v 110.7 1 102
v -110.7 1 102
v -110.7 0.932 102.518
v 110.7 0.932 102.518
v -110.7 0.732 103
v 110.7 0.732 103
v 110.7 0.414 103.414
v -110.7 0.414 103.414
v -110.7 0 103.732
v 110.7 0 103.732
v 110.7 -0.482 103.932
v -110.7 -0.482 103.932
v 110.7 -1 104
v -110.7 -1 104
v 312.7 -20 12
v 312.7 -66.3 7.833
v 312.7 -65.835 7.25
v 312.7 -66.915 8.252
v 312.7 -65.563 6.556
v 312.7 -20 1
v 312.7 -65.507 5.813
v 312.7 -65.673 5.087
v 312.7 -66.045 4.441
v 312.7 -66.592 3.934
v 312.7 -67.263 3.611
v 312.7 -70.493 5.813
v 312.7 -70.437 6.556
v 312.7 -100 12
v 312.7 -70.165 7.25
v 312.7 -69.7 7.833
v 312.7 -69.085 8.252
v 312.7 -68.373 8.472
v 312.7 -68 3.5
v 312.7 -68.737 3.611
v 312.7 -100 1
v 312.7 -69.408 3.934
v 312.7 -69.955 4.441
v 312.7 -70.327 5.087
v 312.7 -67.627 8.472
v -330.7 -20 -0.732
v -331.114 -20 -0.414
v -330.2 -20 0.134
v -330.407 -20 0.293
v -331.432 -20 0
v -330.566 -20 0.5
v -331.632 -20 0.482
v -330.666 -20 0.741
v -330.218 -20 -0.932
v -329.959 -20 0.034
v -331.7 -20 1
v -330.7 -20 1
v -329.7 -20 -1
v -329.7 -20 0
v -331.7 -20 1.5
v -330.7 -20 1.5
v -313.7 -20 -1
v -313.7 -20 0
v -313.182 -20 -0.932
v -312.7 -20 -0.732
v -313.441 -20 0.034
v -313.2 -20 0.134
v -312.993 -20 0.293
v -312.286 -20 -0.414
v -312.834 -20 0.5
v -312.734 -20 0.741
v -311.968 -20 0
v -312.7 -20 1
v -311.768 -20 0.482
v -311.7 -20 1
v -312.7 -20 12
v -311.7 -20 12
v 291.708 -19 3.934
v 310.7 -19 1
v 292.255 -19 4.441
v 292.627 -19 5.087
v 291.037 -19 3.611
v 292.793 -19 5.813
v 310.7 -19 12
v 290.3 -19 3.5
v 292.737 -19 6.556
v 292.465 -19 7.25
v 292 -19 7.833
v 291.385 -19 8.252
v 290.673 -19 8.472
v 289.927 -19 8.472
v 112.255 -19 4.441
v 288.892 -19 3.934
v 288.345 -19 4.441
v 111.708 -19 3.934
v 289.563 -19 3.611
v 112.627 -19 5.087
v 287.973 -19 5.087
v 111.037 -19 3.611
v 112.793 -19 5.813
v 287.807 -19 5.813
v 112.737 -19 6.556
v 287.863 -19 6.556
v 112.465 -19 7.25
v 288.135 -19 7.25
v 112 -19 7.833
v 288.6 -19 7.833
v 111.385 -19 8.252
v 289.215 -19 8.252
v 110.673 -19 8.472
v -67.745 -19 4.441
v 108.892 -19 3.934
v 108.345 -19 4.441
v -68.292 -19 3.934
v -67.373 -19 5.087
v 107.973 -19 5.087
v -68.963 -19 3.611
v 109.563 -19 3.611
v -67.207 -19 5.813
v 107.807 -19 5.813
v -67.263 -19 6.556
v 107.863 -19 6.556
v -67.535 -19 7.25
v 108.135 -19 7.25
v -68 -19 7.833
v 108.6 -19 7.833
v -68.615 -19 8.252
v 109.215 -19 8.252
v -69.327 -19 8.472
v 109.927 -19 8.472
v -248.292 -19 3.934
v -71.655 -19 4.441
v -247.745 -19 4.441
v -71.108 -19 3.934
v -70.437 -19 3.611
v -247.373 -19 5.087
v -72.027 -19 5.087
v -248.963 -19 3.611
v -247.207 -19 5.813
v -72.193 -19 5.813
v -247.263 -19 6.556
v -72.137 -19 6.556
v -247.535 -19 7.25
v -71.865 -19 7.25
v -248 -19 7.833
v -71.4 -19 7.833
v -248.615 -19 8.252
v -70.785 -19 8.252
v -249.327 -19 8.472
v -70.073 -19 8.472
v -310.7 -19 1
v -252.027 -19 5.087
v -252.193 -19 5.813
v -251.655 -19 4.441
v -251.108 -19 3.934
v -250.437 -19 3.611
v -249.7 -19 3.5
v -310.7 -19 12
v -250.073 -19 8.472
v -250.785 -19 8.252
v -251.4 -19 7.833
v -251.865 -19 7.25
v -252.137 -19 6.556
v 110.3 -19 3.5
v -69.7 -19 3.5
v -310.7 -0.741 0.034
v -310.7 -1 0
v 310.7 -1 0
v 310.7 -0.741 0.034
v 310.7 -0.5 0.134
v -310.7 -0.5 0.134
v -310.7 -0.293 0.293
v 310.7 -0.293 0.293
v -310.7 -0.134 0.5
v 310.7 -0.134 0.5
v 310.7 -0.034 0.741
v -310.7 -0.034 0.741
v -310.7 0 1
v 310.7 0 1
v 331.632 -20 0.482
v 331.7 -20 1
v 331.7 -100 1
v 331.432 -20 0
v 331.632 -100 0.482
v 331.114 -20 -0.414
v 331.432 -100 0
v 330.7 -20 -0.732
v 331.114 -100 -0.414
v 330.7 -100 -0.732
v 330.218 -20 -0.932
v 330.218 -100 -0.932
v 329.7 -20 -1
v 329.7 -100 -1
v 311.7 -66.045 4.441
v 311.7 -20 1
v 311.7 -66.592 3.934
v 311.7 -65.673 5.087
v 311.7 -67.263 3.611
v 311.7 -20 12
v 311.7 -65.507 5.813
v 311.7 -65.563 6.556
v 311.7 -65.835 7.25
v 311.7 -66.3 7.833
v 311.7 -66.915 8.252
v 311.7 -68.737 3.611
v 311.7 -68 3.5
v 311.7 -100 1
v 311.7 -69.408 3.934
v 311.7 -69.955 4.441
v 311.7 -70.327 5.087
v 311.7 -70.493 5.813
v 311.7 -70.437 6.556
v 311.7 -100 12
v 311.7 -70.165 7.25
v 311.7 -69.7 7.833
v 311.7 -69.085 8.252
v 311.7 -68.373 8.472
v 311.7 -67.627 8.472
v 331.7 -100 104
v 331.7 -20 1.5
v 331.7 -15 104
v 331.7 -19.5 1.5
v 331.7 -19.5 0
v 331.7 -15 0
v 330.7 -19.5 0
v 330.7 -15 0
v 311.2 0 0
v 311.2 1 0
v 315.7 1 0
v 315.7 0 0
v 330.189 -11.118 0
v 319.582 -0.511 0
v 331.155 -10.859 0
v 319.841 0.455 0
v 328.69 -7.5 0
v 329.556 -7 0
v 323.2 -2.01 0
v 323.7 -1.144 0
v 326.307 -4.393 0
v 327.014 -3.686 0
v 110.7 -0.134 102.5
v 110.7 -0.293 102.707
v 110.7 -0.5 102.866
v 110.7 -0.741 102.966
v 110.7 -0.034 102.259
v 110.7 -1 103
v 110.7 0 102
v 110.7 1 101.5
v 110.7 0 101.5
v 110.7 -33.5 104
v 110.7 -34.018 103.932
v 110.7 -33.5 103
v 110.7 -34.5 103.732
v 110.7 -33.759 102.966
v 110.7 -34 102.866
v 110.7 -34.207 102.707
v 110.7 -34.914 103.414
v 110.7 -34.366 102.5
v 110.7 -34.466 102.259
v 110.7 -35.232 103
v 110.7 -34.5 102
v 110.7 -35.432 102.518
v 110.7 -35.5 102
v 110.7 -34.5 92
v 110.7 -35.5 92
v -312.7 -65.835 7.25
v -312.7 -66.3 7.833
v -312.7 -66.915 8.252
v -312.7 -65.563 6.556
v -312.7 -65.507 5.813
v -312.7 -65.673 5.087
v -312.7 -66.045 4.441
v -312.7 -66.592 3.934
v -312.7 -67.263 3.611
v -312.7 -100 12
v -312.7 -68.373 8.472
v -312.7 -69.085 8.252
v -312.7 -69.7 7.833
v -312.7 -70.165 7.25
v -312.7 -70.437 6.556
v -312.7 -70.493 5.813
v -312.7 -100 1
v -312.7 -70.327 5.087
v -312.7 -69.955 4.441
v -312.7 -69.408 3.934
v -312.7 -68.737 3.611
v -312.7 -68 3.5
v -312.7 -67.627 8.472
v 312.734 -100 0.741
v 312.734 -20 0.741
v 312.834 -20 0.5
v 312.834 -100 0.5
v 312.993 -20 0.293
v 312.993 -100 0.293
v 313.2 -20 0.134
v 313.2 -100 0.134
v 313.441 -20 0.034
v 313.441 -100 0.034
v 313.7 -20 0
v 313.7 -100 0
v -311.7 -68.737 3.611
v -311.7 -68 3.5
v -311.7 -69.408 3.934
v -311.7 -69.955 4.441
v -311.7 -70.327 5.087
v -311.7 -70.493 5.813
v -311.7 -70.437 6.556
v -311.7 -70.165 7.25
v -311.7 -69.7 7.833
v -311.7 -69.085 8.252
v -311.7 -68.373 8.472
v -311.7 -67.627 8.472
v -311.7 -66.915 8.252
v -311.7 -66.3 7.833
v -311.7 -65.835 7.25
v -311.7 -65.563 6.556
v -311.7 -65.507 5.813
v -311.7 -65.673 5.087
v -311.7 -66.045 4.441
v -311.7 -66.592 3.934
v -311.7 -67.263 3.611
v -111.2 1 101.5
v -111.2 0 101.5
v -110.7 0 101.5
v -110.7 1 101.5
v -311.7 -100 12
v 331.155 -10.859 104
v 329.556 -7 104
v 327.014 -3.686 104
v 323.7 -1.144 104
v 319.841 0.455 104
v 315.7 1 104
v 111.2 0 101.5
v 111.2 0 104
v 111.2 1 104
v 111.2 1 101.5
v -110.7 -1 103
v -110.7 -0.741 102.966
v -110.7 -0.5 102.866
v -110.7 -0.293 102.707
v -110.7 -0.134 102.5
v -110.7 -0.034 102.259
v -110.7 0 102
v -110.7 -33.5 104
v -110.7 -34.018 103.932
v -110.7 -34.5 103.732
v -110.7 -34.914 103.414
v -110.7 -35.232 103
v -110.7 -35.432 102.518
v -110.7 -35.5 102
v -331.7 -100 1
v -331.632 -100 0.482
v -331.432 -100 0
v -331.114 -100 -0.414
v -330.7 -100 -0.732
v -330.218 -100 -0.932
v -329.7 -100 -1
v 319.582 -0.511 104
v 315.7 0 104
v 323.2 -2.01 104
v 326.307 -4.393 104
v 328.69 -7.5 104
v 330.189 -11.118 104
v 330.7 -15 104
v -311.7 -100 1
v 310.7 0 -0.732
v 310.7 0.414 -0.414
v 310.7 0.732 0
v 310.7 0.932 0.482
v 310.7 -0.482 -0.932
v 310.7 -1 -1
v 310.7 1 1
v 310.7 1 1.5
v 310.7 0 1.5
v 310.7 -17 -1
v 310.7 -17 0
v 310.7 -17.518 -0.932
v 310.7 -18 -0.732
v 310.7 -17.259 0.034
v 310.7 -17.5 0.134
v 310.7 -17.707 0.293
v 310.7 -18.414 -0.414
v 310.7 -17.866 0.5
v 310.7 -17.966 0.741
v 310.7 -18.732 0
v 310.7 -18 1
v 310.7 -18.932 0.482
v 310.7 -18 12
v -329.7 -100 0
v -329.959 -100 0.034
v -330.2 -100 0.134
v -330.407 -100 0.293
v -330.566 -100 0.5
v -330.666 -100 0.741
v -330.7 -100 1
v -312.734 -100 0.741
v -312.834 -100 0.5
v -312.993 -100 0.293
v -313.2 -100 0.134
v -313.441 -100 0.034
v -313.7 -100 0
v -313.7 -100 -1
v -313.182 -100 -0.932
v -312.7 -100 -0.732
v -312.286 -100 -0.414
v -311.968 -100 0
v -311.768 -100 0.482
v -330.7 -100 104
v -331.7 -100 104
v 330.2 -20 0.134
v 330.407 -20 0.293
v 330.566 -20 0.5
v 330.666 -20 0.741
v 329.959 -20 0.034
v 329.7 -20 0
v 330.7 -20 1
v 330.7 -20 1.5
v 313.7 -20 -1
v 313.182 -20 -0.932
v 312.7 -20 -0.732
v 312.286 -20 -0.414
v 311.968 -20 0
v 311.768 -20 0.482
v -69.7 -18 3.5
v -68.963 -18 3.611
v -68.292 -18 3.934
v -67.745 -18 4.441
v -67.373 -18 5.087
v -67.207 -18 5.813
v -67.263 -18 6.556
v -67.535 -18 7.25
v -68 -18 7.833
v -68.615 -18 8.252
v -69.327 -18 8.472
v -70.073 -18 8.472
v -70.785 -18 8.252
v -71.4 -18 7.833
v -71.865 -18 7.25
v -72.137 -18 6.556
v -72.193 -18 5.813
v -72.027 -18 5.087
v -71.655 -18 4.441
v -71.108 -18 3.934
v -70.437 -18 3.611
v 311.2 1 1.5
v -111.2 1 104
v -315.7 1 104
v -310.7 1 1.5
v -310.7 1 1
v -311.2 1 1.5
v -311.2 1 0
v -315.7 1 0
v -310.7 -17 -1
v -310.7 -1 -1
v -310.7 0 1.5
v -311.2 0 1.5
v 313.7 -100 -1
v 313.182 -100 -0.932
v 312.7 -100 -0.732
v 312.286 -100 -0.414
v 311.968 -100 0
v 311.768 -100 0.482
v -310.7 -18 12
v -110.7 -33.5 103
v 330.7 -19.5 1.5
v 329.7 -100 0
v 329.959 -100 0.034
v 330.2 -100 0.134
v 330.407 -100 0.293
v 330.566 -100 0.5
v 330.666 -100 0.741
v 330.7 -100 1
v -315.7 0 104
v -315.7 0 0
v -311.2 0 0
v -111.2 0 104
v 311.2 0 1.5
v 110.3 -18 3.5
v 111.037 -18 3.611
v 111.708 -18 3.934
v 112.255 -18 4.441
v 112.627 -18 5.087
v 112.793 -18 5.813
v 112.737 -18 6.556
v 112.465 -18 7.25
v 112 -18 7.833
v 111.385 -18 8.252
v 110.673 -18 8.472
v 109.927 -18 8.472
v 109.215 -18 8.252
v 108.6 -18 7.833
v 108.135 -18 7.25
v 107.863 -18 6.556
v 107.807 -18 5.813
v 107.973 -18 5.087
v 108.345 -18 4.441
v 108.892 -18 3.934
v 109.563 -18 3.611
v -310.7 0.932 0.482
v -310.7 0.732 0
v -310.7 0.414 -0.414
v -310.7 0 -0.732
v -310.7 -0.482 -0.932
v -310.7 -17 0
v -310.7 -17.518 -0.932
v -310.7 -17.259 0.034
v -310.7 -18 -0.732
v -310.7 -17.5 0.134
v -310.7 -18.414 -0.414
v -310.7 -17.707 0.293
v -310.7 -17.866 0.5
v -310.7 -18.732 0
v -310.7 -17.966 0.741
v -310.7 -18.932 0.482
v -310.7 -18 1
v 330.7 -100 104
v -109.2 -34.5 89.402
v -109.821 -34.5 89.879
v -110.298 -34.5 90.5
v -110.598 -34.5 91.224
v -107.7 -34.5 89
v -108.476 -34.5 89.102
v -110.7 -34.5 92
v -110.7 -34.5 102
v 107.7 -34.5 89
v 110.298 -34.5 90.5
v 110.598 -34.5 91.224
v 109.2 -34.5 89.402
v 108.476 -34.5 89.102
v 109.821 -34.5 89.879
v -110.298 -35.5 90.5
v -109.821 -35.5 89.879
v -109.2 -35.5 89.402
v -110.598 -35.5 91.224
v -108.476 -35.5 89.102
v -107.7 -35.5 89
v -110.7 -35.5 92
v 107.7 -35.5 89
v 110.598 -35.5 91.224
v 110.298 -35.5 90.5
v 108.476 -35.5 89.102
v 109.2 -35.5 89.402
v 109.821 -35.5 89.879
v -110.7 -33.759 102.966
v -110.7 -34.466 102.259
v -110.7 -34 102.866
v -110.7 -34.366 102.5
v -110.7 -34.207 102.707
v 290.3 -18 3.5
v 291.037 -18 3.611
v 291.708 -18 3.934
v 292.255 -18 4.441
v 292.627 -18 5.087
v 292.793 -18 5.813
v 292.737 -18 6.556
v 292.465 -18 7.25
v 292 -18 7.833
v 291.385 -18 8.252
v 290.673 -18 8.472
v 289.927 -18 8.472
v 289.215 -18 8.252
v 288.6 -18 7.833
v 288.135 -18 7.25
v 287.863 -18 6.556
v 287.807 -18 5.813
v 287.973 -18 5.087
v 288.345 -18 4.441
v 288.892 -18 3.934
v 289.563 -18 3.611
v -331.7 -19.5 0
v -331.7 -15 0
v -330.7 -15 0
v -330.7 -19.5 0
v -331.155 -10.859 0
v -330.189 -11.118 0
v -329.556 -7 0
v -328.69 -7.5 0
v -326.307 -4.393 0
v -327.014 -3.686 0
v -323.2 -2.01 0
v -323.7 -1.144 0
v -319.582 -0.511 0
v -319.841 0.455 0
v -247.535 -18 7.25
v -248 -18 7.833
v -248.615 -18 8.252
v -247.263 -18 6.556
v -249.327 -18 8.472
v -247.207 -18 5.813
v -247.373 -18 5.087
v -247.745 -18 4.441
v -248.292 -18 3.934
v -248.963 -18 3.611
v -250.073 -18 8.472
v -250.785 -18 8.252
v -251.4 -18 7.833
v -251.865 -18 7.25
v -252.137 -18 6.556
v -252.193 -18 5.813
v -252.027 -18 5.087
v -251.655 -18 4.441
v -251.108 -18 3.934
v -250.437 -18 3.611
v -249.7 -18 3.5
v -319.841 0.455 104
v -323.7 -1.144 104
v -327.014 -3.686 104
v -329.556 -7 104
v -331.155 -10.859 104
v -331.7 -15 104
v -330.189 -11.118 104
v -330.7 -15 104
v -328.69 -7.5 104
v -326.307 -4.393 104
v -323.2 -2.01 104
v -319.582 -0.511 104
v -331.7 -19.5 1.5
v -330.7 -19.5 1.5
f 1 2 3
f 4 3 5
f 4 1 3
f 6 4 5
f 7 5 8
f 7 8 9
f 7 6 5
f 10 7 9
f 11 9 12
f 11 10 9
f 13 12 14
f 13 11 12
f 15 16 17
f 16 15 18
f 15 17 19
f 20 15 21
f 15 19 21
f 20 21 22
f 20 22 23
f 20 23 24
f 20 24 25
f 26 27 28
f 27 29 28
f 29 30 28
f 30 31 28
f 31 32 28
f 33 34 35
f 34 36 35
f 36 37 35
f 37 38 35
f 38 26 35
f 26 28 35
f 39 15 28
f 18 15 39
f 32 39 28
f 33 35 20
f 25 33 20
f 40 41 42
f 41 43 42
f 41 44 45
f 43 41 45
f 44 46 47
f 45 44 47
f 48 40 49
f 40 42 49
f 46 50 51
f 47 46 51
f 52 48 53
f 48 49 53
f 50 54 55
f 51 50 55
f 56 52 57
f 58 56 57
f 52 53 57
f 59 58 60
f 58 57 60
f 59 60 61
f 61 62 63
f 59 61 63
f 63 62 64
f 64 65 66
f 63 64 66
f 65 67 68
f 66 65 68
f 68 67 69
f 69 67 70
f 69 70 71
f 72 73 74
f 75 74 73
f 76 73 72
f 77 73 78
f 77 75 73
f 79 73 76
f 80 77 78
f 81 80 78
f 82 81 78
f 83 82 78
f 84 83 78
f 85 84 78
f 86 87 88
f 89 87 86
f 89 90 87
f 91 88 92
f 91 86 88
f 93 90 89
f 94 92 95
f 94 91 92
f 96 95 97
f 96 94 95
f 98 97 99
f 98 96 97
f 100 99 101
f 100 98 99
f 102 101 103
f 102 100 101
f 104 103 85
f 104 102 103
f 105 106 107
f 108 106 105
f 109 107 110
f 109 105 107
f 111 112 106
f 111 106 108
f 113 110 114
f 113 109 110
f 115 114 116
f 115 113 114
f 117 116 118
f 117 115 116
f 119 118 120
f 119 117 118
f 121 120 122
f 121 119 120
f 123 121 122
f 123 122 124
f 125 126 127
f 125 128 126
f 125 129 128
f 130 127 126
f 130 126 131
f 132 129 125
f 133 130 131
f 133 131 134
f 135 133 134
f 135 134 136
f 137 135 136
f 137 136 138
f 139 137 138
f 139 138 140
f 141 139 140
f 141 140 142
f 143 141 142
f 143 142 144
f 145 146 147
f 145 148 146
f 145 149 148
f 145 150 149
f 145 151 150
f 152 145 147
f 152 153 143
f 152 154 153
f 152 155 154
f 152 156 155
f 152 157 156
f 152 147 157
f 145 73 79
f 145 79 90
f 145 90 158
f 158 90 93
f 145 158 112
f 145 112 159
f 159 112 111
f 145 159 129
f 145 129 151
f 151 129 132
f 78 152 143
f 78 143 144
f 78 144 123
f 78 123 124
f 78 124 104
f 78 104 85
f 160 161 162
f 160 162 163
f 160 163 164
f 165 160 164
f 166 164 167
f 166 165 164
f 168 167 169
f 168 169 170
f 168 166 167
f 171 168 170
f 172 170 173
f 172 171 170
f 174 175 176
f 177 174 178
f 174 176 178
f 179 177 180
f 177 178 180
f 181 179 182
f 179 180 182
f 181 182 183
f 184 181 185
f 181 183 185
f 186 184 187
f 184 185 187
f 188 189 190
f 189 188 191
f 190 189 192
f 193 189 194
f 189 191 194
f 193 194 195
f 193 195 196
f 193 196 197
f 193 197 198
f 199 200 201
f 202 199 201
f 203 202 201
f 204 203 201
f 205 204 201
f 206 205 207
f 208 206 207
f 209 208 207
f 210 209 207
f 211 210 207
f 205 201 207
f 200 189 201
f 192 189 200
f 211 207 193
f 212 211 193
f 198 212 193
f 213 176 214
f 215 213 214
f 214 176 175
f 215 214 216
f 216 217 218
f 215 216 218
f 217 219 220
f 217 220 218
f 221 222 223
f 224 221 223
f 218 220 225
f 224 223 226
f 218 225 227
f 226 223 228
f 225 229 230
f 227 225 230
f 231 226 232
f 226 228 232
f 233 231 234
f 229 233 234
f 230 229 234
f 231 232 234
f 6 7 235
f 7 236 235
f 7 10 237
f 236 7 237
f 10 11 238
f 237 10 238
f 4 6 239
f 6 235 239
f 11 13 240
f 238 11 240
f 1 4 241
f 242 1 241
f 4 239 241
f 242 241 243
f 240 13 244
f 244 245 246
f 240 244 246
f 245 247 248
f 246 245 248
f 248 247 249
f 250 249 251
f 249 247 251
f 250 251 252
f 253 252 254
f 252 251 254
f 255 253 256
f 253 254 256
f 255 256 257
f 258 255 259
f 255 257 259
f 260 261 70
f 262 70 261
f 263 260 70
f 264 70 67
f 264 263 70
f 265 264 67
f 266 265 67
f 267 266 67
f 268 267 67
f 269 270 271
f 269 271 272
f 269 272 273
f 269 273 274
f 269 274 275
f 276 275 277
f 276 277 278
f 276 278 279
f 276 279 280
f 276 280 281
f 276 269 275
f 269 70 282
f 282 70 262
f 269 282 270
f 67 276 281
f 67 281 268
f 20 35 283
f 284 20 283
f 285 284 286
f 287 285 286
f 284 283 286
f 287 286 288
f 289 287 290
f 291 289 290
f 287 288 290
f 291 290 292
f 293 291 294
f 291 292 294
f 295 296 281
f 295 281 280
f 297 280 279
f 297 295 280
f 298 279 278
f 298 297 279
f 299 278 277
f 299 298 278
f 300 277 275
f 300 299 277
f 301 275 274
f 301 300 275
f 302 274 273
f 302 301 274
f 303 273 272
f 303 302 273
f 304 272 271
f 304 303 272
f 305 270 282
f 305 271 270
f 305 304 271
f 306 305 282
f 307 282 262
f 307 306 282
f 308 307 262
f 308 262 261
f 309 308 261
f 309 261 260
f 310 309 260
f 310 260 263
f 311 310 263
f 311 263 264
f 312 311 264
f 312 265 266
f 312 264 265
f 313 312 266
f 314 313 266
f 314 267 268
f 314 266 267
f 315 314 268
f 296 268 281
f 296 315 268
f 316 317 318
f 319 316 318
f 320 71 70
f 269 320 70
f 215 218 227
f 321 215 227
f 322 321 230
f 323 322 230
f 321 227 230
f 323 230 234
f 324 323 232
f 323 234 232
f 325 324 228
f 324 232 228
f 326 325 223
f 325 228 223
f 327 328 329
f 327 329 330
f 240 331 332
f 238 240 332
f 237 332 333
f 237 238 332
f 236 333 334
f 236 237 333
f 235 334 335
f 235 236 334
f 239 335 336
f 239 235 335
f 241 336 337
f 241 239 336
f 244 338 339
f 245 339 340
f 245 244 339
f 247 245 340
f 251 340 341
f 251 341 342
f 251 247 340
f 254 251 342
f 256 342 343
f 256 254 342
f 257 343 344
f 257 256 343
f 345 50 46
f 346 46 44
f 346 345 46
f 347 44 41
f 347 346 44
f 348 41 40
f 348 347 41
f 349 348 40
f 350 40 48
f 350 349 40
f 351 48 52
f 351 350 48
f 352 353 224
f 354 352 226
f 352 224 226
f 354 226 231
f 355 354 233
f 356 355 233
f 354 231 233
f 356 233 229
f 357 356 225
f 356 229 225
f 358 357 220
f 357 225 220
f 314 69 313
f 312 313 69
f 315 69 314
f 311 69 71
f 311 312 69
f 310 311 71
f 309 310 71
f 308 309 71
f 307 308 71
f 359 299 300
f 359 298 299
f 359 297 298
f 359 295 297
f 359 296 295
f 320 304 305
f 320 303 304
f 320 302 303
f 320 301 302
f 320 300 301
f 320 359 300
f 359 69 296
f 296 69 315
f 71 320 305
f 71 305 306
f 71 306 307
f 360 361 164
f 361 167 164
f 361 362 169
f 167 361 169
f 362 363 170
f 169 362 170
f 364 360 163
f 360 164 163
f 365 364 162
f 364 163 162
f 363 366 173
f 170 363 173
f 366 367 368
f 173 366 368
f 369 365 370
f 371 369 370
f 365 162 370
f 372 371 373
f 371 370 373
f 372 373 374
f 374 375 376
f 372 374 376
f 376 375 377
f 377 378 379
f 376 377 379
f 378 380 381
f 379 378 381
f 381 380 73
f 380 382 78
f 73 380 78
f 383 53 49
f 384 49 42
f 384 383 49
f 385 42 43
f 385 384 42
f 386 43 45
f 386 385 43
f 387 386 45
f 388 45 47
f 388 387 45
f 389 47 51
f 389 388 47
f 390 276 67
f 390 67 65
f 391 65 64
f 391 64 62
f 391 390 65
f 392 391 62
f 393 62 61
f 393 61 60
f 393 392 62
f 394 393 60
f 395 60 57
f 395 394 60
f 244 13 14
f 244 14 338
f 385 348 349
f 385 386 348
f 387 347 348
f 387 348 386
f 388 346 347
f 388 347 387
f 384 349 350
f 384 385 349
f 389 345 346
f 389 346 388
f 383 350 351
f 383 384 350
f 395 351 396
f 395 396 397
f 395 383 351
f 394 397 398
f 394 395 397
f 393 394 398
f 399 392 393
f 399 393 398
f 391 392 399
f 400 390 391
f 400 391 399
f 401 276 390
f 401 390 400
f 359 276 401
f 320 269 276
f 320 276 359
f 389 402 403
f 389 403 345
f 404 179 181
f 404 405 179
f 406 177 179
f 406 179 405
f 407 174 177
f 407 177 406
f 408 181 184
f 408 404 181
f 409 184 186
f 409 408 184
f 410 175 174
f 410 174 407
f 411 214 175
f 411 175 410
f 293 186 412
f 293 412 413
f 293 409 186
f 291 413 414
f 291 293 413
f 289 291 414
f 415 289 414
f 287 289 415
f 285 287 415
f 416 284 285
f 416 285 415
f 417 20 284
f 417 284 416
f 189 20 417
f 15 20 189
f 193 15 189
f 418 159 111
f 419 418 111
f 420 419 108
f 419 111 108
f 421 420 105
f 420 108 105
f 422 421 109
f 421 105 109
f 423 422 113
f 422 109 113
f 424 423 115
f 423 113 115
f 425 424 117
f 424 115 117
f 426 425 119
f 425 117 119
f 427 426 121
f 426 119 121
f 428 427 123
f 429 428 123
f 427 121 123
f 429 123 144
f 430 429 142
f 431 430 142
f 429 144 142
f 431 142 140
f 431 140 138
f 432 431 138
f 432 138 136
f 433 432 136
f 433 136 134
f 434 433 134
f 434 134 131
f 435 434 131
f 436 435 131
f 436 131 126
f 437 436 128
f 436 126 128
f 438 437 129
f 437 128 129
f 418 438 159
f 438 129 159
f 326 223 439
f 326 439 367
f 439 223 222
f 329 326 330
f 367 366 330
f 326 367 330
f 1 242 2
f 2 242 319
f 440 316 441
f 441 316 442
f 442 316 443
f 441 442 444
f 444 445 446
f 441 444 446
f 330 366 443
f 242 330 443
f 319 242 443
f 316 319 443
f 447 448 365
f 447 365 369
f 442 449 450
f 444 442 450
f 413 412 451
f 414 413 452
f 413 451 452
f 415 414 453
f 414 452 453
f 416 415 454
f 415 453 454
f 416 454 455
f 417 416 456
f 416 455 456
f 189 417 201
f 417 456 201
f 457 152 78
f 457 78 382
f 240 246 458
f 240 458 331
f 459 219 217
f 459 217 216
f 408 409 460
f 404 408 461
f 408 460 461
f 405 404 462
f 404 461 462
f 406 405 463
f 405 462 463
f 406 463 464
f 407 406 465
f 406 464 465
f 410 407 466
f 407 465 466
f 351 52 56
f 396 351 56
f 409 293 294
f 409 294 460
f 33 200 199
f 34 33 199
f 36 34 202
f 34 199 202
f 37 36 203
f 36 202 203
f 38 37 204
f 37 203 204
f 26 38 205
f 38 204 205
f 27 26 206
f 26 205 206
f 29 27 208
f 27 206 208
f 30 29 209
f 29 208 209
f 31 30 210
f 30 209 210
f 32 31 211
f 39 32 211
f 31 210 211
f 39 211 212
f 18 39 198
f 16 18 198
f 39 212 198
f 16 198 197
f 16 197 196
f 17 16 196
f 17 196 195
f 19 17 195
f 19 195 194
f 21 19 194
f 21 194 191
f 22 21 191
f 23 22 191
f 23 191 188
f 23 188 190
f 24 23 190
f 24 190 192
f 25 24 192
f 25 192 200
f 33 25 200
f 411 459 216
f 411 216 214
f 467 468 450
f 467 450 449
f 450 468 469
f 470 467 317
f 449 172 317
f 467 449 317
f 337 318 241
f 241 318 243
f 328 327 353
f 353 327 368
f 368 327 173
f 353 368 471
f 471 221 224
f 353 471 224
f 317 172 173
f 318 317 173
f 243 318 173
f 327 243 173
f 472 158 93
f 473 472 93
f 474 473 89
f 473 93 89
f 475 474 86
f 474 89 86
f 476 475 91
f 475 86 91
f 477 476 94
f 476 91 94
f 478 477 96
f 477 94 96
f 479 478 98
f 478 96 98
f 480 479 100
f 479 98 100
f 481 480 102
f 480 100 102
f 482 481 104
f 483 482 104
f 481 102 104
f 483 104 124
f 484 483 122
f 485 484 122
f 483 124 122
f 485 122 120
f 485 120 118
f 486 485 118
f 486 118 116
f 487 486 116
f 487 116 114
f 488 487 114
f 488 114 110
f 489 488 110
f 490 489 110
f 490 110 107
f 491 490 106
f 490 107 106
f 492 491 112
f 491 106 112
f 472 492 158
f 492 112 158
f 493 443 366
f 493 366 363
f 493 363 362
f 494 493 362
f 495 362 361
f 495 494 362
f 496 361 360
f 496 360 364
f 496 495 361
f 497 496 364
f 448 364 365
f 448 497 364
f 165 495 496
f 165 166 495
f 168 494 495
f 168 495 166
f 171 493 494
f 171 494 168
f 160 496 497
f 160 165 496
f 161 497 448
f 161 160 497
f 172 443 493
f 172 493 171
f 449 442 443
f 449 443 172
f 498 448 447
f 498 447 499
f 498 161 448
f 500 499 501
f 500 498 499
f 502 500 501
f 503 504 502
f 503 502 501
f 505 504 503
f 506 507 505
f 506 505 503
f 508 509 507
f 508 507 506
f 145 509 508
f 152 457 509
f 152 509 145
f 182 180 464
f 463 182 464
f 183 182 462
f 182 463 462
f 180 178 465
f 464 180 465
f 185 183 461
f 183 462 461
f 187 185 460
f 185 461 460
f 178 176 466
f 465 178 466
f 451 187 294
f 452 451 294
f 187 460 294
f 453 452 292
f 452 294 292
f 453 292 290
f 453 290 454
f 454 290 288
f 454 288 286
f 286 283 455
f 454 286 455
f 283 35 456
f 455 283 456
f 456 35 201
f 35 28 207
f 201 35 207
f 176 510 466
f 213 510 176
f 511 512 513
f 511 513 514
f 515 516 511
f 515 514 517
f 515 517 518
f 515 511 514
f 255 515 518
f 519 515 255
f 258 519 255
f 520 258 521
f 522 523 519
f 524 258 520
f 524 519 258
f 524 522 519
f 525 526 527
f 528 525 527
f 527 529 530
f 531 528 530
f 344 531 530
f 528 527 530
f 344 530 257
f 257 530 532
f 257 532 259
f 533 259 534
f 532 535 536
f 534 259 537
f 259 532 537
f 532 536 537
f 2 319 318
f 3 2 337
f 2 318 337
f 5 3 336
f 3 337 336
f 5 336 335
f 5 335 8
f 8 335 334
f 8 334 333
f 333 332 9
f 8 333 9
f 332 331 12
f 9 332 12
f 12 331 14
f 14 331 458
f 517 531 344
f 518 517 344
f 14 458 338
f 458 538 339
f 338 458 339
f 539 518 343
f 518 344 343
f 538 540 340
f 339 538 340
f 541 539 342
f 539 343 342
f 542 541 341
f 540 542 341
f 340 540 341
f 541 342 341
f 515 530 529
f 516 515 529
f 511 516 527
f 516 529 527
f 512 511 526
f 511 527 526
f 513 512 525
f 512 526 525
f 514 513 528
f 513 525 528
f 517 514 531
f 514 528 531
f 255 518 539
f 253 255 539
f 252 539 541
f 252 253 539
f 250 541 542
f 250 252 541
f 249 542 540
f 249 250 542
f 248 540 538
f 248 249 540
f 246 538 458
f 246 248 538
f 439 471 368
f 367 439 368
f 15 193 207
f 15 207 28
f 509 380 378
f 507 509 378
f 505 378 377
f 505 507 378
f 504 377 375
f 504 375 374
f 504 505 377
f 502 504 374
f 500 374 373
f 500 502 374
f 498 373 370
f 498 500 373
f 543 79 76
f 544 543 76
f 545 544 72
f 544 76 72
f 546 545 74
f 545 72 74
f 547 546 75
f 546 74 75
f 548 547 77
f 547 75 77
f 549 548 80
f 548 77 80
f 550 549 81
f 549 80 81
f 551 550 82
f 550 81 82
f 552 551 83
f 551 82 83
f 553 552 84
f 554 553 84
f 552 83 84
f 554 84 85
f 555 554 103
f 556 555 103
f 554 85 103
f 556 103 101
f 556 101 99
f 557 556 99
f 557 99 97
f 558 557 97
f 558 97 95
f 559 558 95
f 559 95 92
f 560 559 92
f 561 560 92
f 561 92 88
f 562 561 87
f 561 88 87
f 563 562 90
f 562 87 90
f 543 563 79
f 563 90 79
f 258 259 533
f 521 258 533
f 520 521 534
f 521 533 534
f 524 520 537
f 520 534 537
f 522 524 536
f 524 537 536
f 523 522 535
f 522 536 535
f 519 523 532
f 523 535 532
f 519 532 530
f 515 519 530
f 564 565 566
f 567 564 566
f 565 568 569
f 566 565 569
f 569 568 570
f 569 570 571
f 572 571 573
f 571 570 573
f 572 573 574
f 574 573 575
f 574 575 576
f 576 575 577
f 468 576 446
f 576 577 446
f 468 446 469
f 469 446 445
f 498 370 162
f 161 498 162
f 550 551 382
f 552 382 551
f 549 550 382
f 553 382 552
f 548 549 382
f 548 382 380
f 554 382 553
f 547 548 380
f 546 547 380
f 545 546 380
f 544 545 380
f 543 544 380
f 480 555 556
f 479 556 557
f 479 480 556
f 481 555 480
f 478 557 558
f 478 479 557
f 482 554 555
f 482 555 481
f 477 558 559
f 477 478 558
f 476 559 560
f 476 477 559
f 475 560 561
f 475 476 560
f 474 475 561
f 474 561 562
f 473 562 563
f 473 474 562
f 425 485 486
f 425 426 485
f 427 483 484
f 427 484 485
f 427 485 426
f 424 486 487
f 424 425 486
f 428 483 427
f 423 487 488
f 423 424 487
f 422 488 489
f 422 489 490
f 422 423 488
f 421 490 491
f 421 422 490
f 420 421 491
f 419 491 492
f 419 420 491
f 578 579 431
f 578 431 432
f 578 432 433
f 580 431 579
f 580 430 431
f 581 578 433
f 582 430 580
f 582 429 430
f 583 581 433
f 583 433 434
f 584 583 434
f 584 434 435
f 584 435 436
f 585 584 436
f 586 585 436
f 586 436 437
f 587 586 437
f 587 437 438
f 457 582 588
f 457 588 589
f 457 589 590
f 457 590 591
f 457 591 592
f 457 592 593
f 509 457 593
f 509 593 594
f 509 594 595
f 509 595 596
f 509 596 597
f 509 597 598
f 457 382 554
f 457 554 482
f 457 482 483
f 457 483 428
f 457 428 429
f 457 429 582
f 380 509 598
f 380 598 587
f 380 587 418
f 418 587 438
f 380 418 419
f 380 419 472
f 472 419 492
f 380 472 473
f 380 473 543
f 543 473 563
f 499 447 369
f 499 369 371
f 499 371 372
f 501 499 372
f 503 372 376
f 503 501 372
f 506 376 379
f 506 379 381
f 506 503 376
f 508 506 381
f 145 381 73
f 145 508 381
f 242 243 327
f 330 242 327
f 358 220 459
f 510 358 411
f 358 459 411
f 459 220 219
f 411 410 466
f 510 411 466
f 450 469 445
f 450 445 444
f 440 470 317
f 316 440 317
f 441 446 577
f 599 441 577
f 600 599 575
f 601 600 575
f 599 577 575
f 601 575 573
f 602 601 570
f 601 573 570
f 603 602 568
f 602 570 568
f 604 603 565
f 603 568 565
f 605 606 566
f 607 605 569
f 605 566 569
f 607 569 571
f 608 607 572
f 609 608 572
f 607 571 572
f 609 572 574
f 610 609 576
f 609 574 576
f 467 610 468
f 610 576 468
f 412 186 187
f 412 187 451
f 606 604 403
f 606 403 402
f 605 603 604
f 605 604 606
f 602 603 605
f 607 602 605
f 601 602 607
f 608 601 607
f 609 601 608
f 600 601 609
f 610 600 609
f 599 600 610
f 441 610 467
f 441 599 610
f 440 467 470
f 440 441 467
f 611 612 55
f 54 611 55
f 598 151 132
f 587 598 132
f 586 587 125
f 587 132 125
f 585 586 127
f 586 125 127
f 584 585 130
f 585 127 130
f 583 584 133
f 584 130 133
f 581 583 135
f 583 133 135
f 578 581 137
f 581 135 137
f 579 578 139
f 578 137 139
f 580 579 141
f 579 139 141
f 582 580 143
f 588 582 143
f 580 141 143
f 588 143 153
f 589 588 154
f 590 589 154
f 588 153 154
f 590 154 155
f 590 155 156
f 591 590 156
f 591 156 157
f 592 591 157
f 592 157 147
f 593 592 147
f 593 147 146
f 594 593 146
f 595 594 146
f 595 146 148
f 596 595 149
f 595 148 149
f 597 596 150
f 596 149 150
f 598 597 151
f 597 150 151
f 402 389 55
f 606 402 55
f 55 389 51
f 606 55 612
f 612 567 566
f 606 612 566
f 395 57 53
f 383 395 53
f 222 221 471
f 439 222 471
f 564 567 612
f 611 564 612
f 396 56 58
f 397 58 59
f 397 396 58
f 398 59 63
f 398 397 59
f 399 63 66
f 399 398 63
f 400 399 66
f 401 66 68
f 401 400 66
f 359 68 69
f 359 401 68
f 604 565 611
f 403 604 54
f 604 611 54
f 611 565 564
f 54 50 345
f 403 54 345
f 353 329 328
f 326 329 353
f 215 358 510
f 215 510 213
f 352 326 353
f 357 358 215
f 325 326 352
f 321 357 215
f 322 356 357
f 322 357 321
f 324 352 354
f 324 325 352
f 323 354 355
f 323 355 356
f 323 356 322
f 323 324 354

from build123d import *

# Parameters (mm, degrees)
BASE_FLANGE1_DEPTH             = 104
EDGE_FLANGE1_STRIP_W           = 6
EDGE_FLANGE1_STRIP_H           = 1
EDGE_FLANGE1_STRIP_CUT_DEPTH   = 621.4
EDGE_FLANGE1_RELIEF_W          = 6.5
EDGE_FLANGE1_RELIEF_H          = 0.5
EDGE_FLANGE1_RELIEF_CUT_DEPTH  = 1
EDGE_FLANGE1_DEPTH             = 621.4
EDGE_FLANGE2_STRIP_W           = 6
EDGE_FLANGE2_STRIP_H           = 1
EDGE_FLANGE2_STRIP_CUT_DEPTH   = 621.4
EDGE_FLANGE2_DEPTH             = 621.4
EDGE_FLANGE3_STRIP_W           = 6
EDGE_FLANGE3_STRIP_H           = 1
EDGE_FLANGE3_STRIP_CUT_DEPTH   = 80
EDGE_FLANGE3_RELIEF_W          = 6.5
EDGE_FLANGE3_RELIEF_H          = 0.5
EDGE_FLANGE3_RELIEF_CUT_DEPTH  = 1
EDGE_FLANGE3_DEPTH             = 80
EDGE_FLANGE4_STRIP_W           = 6
EDGE_FLANGE4_STRIP_H           = 1
EDGE_FLANGE4_STRIP_CUT_DEPTH   = 80
EDGE_FLANGE4_DEPTH             = 80
EDGE_FLANGE5_STRIP_W           = 6
EDGE_FLANGE5_STRIP_H           = 1
EDGE_FLANGE5_STRIP_CUT_DEPTH   = 221.4
EDGE_FLANGE5_RELIEF_W          = 6.5
EDGE_FLANGE5_RELIEF_H          = 0.5
EDGE_FLANGE5_RELIEF_CUT_DEPTH  = 1
EDGE_FLANGE5_DEPTH             = 221.4
SKETCH22_R                     = 2.5
CUT_EXTRUDE1_DEPTH             = 1
SKETCH23_R                     = 2.5
CUT_EXTRUDE2_DEPTH             = 3
CUT_EXTRUDE2_DIRECTION_2_REACH = 661.378
EDGE_FLANGE6_STRIP_W           = 6
EDGE_FLANGE6_STRIP_H           = 1
EDGE_FLANGE6_STRIP_CUT_DEPTH   = 221.4
EDGE_FLANGE6_DEPTH             = 221.4
EDGE_FLANGE6_FLAT_DEPTH        = 1


# Sheet-metal steps are written as plain solids
with BuildPart() as part:
    # Sketch1 → Base-Flange1 (new body)
    with BuildSketch(Plane.XY):
        with BuildLine():
            Line((-330.7, -100), (-330.7, -15))
            ThreePointArc((-330.7, -15), (-326.306601718, -4.393398282), (-315.7, 0))
            Line((-315.7, 0), (315.7, 0))
            ThreePointArc((315.7, 0), (326.306601718, -4.393398282), (330.7, -15))
            Line((330.7, -15), (330.7, -100))
            Line((330.7, -100), (331.7, -100))
            Line((331.7, -100), (331.7, -15))
            ThreePointArc((331.7, -15), (327.013708499, -3.686291501), (315.7, 1))
            Line((315.7, 1), (-315.7, 1))
            ThreePointArc((-315.7, 1), (-327.013708499, -3.686291501), (-331.7, -15))
            Line((-331.7, -15), (-331.7, -100))
            Line((-331.7, -100), (-330.7, -100))
        make_face()
    extrude(amount=BASE_FLANGE1_DEPTH)

    # Edge-Flange1 strip (across the edge) → Edge-Flange1 strip cut (cut)
    with BuildSketch(Plane(origin=(-310.7, 0, 0), x_dir=(0, 0, 1), z_dir=(1, 0, 0))):
        with Locations((-2, -0.5)):
            Rectangle(EDGE_FLANGE1_STRIP_W, EDGE_FLANGE1_STRIP_H)
    extrude(amount=EDGE_FLANGE1_STRIP_CUT_DEPTH, mode=Mode.SUBTRACT)

    # Edge-Flange1 relief (on the sheet) → Edge-Flange1 relief cut (cut)
    with BuildSketch(Plane(origin=(-310.7, 0, 1), x_dir=(0, 0, 1), z_dir=(0, -1, 0))):
        with Locations((-2.75, 0.25)):
            Rectangle(EDGE_FLANGE1_RELIEF_W, EDGE_FLANGE1_RELIEF_H)
        with Locations((-2.75, -621.65)):
            Rectangle(EDGE_FLANGE1_RELIEF_W, EDGE_FLANGE1_RELIEF_H)
    extrude(amount=-EDGE_FLANGE1_RELIEF_CUT_DEPTH, mode=Mode.SUBTRACT)

    # Edge-Flange1 section (across the edge) → Edge-Flange1 (add)
    with BuildSketch(Plane(origin=(-310.7, 0, 0), x_dir=(0, 0, 1), z_dir=(1, 0, 0))):
        with BuildLine():
            Line((-1, 1), (-1, 19))
            Line((-1, 19), (0, 19))
            Line((0, 19), (0, 1))
            ThreePointArc((0, 1), (0.292893219, 0.292893219), (1, 0))
            Line((1, 0), (1, -1))
            ThreePointArc((1, -1), (-0.414213562, -0.414213562), (-1, 1))
        make_face()
    extrude(amount=EDGE_FLANGE1_DEPTH)

    # Edge-Flange2 strip (across the edge) → Edge-Flange2 strip cut (cut)
    with BuildSketch(Plane(origin=(-310.7, -19, 0), x_dir=(0, 1, 0), z_dir=(1, 0, 0))):
        with Locations((-1, -0.5)):
            Rectangle(EDGE_FLANGE2_STRIP_W, EDGE_FLANGE2_STRIP_H)
    extrude(amount=EDGE_FLANGE2_STRIP_CUT_DEPTH, mode=Mode.SUBTRACT)

    # Edge-Flange2 section (across the edge) → Edge-Flange2 (add)
    with BuildSketch(Plane(origin=(-310.7, -19, 0), x_dir=(0, 1, 0), z_dir=(1, 0, 0))):
        with BuildLine():
            Line((0, 1), (0, 12))
            Line((0, 12), (1, 12))
            Line((1, 12), (1, 1))
            ThreePointArc((1, 1), (1.292893219, 0.292893219), (2, 0))
            Line((2, 0), (2, -1))
            ThreePointArc((2, -1), (0.585786438, -0.414213562), (0, 1))
        make_face()
    extrude(amount=EDGE_FLANGE2_DEPTH)

    # Edge-Flange3 strip (across the edge) → Edge-Flange3 strip cut (cut)
    with BuildSketch(Plane(origin=(-330.7, -100, 0), x_dir=(0, 0, 1), z_dir=(0, 1, 0))):
        with Locations((-2, -0.5)):
            Rectangle(EDGE_FLANGE3_STRIP_W, EDGE_FLANGE3_STRIP_H)
    edge_flange3_strip_cut = extrude(amount=EDGE_FLANGE3_STRIP_CUT_DEPTH, mode=Mode.SUBTRACT)

    # Edge-Flange3 relief (on the sheet) → Edge-Flange3 relief cut (cut)
    with BuildSketch(Plane(origin=(-330.7, -100, 1), x_dir=(0, 0, 1), z_dir=(1, 0, 0))):
        with Locations((-2.75, -80.25)):
            Rectangle(EDGE_FLANGE3_RELIEF_W, EDGE_FLANGE3_RELIEF_H)
    edge_flange3_relief_cut = extrude(amount=-EDGE_FLANGE3_RELIEF_CUT_DEPTH, mode=Mode.SUBTRACT)

    # Edge-Flange3 section (across the edge) → Edge-Flange3 (add)
    with BuildSketch(Plane(origin=(-330.7, -100, 0), x_dir=(0, 0, 1), z_dir=(0, 1, 0))):
        with BuildLine():
            Line((-1, 1), (-1, 19))
            Line((-1, 19), (0, 19))
            Line((0, 19), (0, 1))
            ThreePointArc((0, 1), (0.292893219, 0.292893219), (1, 0))
            Line((1, 0), (1, -1))
            ThreePointArc((1, -1), (-0.414213562, -0.414213562), (-1, 1))
        make_face()
    edge_flange3 = extrude(amount=EDGE_FLANGE3_DEPTH)

    # Edge-Flange4 strip (across the edge) → Edge-Flange4 strip cut (cut)
    with BuildSketch(Plane(origin=(-311.7, -100, 0), x_dir=(-1, 0, 0), z_dir=(0, 1, 0))):
        with Locations((-1, -0.5)):
            Rectangle(EDGE_FLANGE4_STRIP_W, EDGE_FLANGE4_STRIP_H)
    edge_flange4_strip_cut = extrude(amount=EDGE_FLANGE4_STRIP_CUT_DEPTH, mode=Mode.SUBTRACT)

    # Edge-Flange4 section (across the edge) → Edge-Flange4 (add)
    with BuildSketch(Plane(origin=(-311.7, -100, 0), x_dir=(-1, 0, 0), z_dir=(0, 1, 0))):
        with BuildLine():
            Line((0, 1), (0, 12))
            Line((0, 12), (1, 12))
            Line((1, 12), (1, 1))
            ThreePointArc((1, 1), (1.292893219, 0.292893219), (2, 0))
            Line((2, 0), (2, -1))
            ThreePointArc((2, -1), (0.585786438, -0.414213562), (0, 1))
        make_face()
    edge_flange4 = extrude(amount=EDGE_FLANGE4_DEPTH)

    # Mirror1: Edge-Flange3 strip cut, Edge-Flange3 relief cut, Edge-Flange3, Edge-Flange4 strip cut, Edge-Flange4 across plane
    add(edge_flange3_strip_cut.mirror(Plane(origin=(0, 0, 0), x_dir=(0, 0, 1), z_dir=(1, 0, 0))), mode=Mode.SUBTRACT)
    add(edge_flange3_relief_cut.mirror(Plane(origin=(0, 0, 0), x_dir=(0, 0, 1), z_dir=(1, 0, 0))), mode=Mode.SUBTRACT)
    add(edge_flange3.mirror(Plane(origin=(0, 0, 0), x_dir=(0, 0, 1), z_dir=(1, 0, 0))))
    add(edge_flange4_strip_cut.mirror(Plane(origin=(0, 0, 0), x_dir=(0, 0, 1), z_dir=(1, 0, 0))), mode=Mode.SUBTRACT)
    add(edge_flange4.mirror(Plane(origin=(0, 0, 0), x_dir=(0, 0, 1), z_dir=(1, 0, 0))))

    # Edge-Flange5 strip (across the edge) → Edge-Flange5 strip cut (cut)
    with BuildSketch(Plane(origin=(110.7, 0, 104), x_dir=(0, 0, -1), z_dir=(-1, 0, 0))):
        with Locations((-1, -0.5)):
            Rectangle(EDGE_FLANGE5_STRIP_W, EDGE_FLANGE5_STRIP_H)
    extrude(amount=EDGE_FLANGE5_STRIP_CUT_DEPTH, mode=Mode.SUBTRACT)

    # Edge-Flange5 relief (on the sheet) → Edge-Flange5 relief cut (cut)
    with BuildSketch(Plane(origin=(110.7, 0, 102), x_dir=(0, 0, -1), z_dir=(0, -1, 0))):
        with Locations((-2.75, 0.25)):
            Rectangle(EDGE_FLANGE5_RELIEF_W, EDGE_FLANGE5_RELIEF_H)
        with Locations((-2.75, -221.65)):
            Rectangle(EDGE_FLANGE5_RELIEF_W, EDGE_FLANGE5_RELIEF_H)
    extrude(amount=-EDGE_FLANGE5_RELIEF_CUT_DEPTH, mode=Mode.SUBTRACT)

    # Edge-Flange5 section (across the edge) → Edge-Flange5 (add)
    with BuildSketch(Plane(origin=(110.7, 0, 104), x_dir=(0, 0, -1), z_dir=(-1, 0, 0))):
        with BuildLine():
            Line((0, 1), (0, 35.5))
            Line((0, 35.5), (1, 35.5))
            Line((1, 35.5), (1, 1))
            ThreePointArc((1, 1), (1.292893219, 0.292893219), (2, 0))
            Line((2, 0), (2, -1))
            ThreePointArc((2, -1), (0.585786438, -0.414213562), (0, 1))
        make_face()
    extrude(amount=EDGE_FLANGE5_DEPTH)

    # Sketch22 → Cut-Extrude1 (cut)
    with BuildSketch(Plane.XZ.offset(19)):
        with Locations(Location((-249.7, 6, 0), (0, 0, 270))):
            Circle(SKETCH22_R)
        with Locations(Location((-69.7, 6, 0), (0, 0, 270))):
            Circle(SKETCH22_R)
        with Locations(Location((110.3, 6, 0), (0, 0, 270))):
            Circle(SKETCH22_R)
        with Locations(Location((290.3, 6, 0), (0, 0, 270))):
            Circle(SKETCH22_R)
        with Locations((470.3, 6)):
            Circle(SKETCH22_R)
        with Locations((650.3, 6)):
            Circle(SKETCH22_R)
        with Locations((830.3, 6)):
            Circle(SKETCH22_R)
    extrude(amount=-CUT_EXTRUDE1_DEPTH, mode=Mode.SUBTRACT)

    # Sketch23 → Cut-Extrude2 (cut)
    with BuildSketch(Plane.ZY.offset(-311.7)):
        with Locations(Location((6, -68, 0), (0, 0, 180))):
            Circle(SKETCH23_R)
    extrude(amount=-CUT_EXTRUDE2_DEPTH, mode=Mode.SUBTRACT)

    # Cut-Extrude2 direction 2: up to this face of the body (flat: up to its plane)
    cut_extrude2_direction_2_end = Plane(part.part.faces().sort_by_distance((-312.7, -60, 6.5))[0])
    # Sketch23 → Cut-Extrude2 direction 2 (cut, up to the picked face)
    with BuildSketch(Plane.ZY.offset(-311.7), mode=Mode.PRIVATE) as cut_extrude2_direction_2_sk1:
        with Locations(Location((6, -68, 0), (0, 0, 180))):
            Circle(SKETCH23_R)
    cut_extrude2_direction_2_tool1 = split(extrude(cut_extrude2_direction_2_sk1.sketch, amount=CUT_EXTRUDE2_DIRECTION_2_REACH, mode=Mode.PRIVATE), bisect_by=cut_extrude2_direction_2_end, keep=Keep.BOTH, mode=Mode.PRIVATE)
    add(cut_extrude2_direction_2_tool1.solids().sort_by(Axis((311.7, -68, 6), (-1, 0, 0)))[0], mode=Mode.SUBTRACT)

    # Edge-Flange6 strip (across the edge) → Edge-Flange6 strip cut (cut)
    with BuildSketch(Plane(origin=(110.7, -35.5, 103), x_dir=(0, 1, 0), z_dir=(-1, 0, 0))):
        with Locations((-1, -0.5)):
            Rectangle(EDGE_FLANGE6_STRIP_W, EDGE_FLANGE6_STRIP_H)
    extrude(amount=EDGE_FLANGE6_STRIP_CUT_DEPTH, mode=Mode.SUBTRACT)

    # Edge-Flange6 bend section (across the edge) → Edge-Flange6 (add)
    with BuildSketch(Plane(origin=(110.7, -35.5, 103), x_dir=(0, 1, 0), z_dir=(-1, 0, 0))):
        with BuildLine():
            Line((0, 1), (1, 1))
            ThreePointArc((1, 1), (1.292893219, 0.292893219), (2, 0))
            Line((2, 0), (2, -1))
            ThreePointArc((2, -1), (0.585786438, -0.414213562), (0, 1))
        make_face()
    extrude(amount=EDGE_FLANGE6_DEPTH)

    # Edge-Flange6 profile (on flange) → Edge-Flange6 flat (add)
    with BuildSketch(Plane(origin=(0, -35.5, 103), x_dir=(1, 0, 0), z_dir=(0, 1, 0))):
        with BuildLine():
            Line((-110.7, 1), (110.7, 1))
            Line((110.7, 1), (110.7, 11))
            ThreePointArc((110.7, 11), (109.821320344, 13.121320344), (107.7, 14))
            Line((107.7, 14), (-107.7, 14))
            ThreePointArc((-107.7, 14), (-109.821320344, 13.121320344), (-110.7, 11))
            Line((-110.7, 11), (-110.7, 1))
        make_face()
    extrude(amount=EDGE_FLANGE6_FLAT_DEPTH)


solid = part.part
